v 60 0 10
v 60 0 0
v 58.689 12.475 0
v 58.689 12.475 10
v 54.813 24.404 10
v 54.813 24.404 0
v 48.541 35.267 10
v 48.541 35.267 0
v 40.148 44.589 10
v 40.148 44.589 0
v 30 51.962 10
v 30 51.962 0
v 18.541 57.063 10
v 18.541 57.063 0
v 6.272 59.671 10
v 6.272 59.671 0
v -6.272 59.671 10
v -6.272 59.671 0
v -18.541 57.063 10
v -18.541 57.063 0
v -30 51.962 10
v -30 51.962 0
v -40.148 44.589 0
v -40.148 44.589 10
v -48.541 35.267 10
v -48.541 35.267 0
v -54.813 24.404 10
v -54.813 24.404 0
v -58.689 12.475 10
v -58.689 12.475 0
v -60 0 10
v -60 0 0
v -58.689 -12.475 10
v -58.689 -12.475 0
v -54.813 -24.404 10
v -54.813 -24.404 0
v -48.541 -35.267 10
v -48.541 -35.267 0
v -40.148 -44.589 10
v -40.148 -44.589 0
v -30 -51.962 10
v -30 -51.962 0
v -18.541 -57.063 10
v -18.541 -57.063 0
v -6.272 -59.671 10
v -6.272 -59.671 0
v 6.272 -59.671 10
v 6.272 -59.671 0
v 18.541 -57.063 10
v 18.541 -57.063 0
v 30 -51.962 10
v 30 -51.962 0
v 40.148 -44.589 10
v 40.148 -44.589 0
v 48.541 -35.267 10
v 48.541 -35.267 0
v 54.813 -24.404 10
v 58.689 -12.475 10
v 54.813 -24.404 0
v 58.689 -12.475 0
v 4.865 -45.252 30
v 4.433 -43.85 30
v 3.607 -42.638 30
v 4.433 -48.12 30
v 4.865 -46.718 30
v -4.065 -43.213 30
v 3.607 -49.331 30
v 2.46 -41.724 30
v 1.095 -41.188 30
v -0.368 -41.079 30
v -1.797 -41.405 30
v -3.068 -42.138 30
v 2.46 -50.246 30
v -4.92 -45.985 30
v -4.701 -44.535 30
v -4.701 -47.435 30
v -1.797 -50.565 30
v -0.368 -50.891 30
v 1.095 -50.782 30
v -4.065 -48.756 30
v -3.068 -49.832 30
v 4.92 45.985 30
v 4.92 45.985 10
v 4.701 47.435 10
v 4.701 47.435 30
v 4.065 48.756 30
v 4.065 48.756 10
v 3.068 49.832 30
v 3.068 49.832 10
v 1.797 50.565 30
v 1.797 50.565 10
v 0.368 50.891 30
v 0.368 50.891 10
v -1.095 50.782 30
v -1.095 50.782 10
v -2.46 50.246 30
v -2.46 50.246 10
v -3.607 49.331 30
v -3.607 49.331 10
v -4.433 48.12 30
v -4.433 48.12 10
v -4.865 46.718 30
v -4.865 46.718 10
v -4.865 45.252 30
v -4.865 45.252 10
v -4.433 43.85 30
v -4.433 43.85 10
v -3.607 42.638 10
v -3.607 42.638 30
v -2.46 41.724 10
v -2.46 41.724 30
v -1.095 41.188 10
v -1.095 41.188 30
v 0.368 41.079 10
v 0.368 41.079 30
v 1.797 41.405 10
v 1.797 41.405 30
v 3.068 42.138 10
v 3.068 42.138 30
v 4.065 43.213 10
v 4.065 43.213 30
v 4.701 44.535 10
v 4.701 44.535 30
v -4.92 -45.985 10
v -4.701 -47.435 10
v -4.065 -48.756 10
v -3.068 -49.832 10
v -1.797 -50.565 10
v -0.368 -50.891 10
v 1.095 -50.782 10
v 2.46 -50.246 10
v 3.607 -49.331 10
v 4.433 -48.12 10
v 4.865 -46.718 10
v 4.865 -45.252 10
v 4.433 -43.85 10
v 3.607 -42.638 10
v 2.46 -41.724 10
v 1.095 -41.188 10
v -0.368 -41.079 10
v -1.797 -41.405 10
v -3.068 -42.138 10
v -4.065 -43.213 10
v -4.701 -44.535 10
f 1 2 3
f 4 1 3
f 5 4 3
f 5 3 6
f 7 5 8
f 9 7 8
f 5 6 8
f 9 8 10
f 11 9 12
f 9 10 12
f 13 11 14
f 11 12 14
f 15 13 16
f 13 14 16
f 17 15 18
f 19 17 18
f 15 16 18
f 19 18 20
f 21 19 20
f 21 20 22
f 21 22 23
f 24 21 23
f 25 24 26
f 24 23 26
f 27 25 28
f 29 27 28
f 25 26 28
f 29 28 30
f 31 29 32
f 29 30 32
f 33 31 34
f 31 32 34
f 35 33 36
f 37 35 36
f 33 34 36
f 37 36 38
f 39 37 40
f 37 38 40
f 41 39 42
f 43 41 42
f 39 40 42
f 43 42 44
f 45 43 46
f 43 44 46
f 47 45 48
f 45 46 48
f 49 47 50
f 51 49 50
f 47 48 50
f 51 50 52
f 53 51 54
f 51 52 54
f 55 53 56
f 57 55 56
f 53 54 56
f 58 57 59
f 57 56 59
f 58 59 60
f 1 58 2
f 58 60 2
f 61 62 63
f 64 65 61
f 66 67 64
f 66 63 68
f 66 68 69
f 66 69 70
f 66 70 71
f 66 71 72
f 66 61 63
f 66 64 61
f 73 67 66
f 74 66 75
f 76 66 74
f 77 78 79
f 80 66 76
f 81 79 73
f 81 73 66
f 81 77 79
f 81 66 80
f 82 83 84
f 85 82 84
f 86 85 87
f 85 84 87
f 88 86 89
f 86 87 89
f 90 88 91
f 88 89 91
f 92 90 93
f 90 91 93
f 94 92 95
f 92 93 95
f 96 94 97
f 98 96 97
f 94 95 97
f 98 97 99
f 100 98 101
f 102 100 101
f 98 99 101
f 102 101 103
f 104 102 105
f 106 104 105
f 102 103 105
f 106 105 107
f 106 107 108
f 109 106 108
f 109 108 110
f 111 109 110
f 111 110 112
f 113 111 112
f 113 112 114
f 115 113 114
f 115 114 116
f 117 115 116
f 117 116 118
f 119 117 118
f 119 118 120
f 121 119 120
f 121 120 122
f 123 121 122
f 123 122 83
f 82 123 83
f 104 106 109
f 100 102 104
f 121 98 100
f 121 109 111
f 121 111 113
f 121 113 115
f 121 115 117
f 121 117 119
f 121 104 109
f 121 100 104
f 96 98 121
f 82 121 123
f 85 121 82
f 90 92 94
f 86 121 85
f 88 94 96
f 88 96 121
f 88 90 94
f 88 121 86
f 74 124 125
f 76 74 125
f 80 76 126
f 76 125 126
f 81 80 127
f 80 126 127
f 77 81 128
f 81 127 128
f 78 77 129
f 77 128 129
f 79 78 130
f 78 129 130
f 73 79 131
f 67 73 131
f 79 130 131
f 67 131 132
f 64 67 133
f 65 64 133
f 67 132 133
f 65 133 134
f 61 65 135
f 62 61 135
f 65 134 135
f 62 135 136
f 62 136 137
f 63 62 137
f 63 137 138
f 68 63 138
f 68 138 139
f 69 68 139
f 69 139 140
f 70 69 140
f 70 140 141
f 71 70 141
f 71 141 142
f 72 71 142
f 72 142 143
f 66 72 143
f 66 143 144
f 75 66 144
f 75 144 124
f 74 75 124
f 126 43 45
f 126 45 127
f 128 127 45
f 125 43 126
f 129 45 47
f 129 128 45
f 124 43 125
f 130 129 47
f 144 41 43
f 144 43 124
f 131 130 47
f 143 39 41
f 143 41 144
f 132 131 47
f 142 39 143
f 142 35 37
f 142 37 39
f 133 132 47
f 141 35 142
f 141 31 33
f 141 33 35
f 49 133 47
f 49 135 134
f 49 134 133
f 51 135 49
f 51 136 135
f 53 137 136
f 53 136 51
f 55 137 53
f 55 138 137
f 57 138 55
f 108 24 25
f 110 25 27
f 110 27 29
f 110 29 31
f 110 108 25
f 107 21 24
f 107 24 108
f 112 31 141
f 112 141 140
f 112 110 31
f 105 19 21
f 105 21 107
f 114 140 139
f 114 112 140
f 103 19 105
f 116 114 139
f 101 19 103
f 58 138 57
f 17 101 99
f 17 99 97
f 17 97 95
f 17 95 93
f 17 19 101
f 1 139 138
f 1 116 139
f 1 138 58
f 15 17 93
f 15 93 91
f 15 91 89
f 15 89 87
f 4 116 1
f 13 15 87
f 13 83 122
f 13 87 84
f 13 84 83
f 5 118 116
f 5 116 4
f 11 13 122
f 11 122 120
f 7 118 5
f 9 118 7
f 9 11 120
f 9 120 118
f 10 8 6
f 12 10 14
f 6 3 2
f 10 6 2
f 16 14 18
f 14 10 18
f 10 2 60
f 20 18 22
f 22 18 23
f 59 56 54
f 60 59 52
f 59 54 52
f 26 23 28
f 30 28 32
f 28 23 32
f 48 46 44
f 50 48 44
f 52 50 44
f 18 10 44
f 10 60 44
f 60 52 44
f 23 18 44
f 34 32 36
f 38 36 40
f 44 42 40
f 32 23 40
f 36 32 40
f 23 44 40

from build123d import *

# Parameters (mm, degrees)
SKETCH1_R           = 60
BOSS_EXTRUDE1_DEPTH = 10
SKETCH2_R           = 4.92
BOSS_EXTRUDE2_DEPTH = 30
CIRPATTERN1_COUNT   = 2


with BuildPart() as part:
    # Sketch1 → Boss-Extrude1 (new body)
    with BuildSketch(Plane.XY):
        Circle(SKETCH1_R)
    extrude(amount=BOSS_EXTRUDE1_DEPTH)

    # Sketch2 → Boss-Extrude2 (add)
    with BuildSketch(Plane.XY):
        with Locations((0, 45.984931592)):
            Circle(SKETCH2_R)
    boss_extrude2 = extrude(amount=BOSS_EXTRUDE2_DEPTH)

    # CirPattern1: Boss-Extrude2 ×2 about axis
    cirpattern1_axis = Axis((0, 0, 10), (0, 0, -1))
    for i in range(1, CIRPATTERN1_COUNT):
        add(boss_extrude2.rotate(cirpattern1_axis, i * 360 / CIRPATTERN1_COUNT))


solid = part.part
